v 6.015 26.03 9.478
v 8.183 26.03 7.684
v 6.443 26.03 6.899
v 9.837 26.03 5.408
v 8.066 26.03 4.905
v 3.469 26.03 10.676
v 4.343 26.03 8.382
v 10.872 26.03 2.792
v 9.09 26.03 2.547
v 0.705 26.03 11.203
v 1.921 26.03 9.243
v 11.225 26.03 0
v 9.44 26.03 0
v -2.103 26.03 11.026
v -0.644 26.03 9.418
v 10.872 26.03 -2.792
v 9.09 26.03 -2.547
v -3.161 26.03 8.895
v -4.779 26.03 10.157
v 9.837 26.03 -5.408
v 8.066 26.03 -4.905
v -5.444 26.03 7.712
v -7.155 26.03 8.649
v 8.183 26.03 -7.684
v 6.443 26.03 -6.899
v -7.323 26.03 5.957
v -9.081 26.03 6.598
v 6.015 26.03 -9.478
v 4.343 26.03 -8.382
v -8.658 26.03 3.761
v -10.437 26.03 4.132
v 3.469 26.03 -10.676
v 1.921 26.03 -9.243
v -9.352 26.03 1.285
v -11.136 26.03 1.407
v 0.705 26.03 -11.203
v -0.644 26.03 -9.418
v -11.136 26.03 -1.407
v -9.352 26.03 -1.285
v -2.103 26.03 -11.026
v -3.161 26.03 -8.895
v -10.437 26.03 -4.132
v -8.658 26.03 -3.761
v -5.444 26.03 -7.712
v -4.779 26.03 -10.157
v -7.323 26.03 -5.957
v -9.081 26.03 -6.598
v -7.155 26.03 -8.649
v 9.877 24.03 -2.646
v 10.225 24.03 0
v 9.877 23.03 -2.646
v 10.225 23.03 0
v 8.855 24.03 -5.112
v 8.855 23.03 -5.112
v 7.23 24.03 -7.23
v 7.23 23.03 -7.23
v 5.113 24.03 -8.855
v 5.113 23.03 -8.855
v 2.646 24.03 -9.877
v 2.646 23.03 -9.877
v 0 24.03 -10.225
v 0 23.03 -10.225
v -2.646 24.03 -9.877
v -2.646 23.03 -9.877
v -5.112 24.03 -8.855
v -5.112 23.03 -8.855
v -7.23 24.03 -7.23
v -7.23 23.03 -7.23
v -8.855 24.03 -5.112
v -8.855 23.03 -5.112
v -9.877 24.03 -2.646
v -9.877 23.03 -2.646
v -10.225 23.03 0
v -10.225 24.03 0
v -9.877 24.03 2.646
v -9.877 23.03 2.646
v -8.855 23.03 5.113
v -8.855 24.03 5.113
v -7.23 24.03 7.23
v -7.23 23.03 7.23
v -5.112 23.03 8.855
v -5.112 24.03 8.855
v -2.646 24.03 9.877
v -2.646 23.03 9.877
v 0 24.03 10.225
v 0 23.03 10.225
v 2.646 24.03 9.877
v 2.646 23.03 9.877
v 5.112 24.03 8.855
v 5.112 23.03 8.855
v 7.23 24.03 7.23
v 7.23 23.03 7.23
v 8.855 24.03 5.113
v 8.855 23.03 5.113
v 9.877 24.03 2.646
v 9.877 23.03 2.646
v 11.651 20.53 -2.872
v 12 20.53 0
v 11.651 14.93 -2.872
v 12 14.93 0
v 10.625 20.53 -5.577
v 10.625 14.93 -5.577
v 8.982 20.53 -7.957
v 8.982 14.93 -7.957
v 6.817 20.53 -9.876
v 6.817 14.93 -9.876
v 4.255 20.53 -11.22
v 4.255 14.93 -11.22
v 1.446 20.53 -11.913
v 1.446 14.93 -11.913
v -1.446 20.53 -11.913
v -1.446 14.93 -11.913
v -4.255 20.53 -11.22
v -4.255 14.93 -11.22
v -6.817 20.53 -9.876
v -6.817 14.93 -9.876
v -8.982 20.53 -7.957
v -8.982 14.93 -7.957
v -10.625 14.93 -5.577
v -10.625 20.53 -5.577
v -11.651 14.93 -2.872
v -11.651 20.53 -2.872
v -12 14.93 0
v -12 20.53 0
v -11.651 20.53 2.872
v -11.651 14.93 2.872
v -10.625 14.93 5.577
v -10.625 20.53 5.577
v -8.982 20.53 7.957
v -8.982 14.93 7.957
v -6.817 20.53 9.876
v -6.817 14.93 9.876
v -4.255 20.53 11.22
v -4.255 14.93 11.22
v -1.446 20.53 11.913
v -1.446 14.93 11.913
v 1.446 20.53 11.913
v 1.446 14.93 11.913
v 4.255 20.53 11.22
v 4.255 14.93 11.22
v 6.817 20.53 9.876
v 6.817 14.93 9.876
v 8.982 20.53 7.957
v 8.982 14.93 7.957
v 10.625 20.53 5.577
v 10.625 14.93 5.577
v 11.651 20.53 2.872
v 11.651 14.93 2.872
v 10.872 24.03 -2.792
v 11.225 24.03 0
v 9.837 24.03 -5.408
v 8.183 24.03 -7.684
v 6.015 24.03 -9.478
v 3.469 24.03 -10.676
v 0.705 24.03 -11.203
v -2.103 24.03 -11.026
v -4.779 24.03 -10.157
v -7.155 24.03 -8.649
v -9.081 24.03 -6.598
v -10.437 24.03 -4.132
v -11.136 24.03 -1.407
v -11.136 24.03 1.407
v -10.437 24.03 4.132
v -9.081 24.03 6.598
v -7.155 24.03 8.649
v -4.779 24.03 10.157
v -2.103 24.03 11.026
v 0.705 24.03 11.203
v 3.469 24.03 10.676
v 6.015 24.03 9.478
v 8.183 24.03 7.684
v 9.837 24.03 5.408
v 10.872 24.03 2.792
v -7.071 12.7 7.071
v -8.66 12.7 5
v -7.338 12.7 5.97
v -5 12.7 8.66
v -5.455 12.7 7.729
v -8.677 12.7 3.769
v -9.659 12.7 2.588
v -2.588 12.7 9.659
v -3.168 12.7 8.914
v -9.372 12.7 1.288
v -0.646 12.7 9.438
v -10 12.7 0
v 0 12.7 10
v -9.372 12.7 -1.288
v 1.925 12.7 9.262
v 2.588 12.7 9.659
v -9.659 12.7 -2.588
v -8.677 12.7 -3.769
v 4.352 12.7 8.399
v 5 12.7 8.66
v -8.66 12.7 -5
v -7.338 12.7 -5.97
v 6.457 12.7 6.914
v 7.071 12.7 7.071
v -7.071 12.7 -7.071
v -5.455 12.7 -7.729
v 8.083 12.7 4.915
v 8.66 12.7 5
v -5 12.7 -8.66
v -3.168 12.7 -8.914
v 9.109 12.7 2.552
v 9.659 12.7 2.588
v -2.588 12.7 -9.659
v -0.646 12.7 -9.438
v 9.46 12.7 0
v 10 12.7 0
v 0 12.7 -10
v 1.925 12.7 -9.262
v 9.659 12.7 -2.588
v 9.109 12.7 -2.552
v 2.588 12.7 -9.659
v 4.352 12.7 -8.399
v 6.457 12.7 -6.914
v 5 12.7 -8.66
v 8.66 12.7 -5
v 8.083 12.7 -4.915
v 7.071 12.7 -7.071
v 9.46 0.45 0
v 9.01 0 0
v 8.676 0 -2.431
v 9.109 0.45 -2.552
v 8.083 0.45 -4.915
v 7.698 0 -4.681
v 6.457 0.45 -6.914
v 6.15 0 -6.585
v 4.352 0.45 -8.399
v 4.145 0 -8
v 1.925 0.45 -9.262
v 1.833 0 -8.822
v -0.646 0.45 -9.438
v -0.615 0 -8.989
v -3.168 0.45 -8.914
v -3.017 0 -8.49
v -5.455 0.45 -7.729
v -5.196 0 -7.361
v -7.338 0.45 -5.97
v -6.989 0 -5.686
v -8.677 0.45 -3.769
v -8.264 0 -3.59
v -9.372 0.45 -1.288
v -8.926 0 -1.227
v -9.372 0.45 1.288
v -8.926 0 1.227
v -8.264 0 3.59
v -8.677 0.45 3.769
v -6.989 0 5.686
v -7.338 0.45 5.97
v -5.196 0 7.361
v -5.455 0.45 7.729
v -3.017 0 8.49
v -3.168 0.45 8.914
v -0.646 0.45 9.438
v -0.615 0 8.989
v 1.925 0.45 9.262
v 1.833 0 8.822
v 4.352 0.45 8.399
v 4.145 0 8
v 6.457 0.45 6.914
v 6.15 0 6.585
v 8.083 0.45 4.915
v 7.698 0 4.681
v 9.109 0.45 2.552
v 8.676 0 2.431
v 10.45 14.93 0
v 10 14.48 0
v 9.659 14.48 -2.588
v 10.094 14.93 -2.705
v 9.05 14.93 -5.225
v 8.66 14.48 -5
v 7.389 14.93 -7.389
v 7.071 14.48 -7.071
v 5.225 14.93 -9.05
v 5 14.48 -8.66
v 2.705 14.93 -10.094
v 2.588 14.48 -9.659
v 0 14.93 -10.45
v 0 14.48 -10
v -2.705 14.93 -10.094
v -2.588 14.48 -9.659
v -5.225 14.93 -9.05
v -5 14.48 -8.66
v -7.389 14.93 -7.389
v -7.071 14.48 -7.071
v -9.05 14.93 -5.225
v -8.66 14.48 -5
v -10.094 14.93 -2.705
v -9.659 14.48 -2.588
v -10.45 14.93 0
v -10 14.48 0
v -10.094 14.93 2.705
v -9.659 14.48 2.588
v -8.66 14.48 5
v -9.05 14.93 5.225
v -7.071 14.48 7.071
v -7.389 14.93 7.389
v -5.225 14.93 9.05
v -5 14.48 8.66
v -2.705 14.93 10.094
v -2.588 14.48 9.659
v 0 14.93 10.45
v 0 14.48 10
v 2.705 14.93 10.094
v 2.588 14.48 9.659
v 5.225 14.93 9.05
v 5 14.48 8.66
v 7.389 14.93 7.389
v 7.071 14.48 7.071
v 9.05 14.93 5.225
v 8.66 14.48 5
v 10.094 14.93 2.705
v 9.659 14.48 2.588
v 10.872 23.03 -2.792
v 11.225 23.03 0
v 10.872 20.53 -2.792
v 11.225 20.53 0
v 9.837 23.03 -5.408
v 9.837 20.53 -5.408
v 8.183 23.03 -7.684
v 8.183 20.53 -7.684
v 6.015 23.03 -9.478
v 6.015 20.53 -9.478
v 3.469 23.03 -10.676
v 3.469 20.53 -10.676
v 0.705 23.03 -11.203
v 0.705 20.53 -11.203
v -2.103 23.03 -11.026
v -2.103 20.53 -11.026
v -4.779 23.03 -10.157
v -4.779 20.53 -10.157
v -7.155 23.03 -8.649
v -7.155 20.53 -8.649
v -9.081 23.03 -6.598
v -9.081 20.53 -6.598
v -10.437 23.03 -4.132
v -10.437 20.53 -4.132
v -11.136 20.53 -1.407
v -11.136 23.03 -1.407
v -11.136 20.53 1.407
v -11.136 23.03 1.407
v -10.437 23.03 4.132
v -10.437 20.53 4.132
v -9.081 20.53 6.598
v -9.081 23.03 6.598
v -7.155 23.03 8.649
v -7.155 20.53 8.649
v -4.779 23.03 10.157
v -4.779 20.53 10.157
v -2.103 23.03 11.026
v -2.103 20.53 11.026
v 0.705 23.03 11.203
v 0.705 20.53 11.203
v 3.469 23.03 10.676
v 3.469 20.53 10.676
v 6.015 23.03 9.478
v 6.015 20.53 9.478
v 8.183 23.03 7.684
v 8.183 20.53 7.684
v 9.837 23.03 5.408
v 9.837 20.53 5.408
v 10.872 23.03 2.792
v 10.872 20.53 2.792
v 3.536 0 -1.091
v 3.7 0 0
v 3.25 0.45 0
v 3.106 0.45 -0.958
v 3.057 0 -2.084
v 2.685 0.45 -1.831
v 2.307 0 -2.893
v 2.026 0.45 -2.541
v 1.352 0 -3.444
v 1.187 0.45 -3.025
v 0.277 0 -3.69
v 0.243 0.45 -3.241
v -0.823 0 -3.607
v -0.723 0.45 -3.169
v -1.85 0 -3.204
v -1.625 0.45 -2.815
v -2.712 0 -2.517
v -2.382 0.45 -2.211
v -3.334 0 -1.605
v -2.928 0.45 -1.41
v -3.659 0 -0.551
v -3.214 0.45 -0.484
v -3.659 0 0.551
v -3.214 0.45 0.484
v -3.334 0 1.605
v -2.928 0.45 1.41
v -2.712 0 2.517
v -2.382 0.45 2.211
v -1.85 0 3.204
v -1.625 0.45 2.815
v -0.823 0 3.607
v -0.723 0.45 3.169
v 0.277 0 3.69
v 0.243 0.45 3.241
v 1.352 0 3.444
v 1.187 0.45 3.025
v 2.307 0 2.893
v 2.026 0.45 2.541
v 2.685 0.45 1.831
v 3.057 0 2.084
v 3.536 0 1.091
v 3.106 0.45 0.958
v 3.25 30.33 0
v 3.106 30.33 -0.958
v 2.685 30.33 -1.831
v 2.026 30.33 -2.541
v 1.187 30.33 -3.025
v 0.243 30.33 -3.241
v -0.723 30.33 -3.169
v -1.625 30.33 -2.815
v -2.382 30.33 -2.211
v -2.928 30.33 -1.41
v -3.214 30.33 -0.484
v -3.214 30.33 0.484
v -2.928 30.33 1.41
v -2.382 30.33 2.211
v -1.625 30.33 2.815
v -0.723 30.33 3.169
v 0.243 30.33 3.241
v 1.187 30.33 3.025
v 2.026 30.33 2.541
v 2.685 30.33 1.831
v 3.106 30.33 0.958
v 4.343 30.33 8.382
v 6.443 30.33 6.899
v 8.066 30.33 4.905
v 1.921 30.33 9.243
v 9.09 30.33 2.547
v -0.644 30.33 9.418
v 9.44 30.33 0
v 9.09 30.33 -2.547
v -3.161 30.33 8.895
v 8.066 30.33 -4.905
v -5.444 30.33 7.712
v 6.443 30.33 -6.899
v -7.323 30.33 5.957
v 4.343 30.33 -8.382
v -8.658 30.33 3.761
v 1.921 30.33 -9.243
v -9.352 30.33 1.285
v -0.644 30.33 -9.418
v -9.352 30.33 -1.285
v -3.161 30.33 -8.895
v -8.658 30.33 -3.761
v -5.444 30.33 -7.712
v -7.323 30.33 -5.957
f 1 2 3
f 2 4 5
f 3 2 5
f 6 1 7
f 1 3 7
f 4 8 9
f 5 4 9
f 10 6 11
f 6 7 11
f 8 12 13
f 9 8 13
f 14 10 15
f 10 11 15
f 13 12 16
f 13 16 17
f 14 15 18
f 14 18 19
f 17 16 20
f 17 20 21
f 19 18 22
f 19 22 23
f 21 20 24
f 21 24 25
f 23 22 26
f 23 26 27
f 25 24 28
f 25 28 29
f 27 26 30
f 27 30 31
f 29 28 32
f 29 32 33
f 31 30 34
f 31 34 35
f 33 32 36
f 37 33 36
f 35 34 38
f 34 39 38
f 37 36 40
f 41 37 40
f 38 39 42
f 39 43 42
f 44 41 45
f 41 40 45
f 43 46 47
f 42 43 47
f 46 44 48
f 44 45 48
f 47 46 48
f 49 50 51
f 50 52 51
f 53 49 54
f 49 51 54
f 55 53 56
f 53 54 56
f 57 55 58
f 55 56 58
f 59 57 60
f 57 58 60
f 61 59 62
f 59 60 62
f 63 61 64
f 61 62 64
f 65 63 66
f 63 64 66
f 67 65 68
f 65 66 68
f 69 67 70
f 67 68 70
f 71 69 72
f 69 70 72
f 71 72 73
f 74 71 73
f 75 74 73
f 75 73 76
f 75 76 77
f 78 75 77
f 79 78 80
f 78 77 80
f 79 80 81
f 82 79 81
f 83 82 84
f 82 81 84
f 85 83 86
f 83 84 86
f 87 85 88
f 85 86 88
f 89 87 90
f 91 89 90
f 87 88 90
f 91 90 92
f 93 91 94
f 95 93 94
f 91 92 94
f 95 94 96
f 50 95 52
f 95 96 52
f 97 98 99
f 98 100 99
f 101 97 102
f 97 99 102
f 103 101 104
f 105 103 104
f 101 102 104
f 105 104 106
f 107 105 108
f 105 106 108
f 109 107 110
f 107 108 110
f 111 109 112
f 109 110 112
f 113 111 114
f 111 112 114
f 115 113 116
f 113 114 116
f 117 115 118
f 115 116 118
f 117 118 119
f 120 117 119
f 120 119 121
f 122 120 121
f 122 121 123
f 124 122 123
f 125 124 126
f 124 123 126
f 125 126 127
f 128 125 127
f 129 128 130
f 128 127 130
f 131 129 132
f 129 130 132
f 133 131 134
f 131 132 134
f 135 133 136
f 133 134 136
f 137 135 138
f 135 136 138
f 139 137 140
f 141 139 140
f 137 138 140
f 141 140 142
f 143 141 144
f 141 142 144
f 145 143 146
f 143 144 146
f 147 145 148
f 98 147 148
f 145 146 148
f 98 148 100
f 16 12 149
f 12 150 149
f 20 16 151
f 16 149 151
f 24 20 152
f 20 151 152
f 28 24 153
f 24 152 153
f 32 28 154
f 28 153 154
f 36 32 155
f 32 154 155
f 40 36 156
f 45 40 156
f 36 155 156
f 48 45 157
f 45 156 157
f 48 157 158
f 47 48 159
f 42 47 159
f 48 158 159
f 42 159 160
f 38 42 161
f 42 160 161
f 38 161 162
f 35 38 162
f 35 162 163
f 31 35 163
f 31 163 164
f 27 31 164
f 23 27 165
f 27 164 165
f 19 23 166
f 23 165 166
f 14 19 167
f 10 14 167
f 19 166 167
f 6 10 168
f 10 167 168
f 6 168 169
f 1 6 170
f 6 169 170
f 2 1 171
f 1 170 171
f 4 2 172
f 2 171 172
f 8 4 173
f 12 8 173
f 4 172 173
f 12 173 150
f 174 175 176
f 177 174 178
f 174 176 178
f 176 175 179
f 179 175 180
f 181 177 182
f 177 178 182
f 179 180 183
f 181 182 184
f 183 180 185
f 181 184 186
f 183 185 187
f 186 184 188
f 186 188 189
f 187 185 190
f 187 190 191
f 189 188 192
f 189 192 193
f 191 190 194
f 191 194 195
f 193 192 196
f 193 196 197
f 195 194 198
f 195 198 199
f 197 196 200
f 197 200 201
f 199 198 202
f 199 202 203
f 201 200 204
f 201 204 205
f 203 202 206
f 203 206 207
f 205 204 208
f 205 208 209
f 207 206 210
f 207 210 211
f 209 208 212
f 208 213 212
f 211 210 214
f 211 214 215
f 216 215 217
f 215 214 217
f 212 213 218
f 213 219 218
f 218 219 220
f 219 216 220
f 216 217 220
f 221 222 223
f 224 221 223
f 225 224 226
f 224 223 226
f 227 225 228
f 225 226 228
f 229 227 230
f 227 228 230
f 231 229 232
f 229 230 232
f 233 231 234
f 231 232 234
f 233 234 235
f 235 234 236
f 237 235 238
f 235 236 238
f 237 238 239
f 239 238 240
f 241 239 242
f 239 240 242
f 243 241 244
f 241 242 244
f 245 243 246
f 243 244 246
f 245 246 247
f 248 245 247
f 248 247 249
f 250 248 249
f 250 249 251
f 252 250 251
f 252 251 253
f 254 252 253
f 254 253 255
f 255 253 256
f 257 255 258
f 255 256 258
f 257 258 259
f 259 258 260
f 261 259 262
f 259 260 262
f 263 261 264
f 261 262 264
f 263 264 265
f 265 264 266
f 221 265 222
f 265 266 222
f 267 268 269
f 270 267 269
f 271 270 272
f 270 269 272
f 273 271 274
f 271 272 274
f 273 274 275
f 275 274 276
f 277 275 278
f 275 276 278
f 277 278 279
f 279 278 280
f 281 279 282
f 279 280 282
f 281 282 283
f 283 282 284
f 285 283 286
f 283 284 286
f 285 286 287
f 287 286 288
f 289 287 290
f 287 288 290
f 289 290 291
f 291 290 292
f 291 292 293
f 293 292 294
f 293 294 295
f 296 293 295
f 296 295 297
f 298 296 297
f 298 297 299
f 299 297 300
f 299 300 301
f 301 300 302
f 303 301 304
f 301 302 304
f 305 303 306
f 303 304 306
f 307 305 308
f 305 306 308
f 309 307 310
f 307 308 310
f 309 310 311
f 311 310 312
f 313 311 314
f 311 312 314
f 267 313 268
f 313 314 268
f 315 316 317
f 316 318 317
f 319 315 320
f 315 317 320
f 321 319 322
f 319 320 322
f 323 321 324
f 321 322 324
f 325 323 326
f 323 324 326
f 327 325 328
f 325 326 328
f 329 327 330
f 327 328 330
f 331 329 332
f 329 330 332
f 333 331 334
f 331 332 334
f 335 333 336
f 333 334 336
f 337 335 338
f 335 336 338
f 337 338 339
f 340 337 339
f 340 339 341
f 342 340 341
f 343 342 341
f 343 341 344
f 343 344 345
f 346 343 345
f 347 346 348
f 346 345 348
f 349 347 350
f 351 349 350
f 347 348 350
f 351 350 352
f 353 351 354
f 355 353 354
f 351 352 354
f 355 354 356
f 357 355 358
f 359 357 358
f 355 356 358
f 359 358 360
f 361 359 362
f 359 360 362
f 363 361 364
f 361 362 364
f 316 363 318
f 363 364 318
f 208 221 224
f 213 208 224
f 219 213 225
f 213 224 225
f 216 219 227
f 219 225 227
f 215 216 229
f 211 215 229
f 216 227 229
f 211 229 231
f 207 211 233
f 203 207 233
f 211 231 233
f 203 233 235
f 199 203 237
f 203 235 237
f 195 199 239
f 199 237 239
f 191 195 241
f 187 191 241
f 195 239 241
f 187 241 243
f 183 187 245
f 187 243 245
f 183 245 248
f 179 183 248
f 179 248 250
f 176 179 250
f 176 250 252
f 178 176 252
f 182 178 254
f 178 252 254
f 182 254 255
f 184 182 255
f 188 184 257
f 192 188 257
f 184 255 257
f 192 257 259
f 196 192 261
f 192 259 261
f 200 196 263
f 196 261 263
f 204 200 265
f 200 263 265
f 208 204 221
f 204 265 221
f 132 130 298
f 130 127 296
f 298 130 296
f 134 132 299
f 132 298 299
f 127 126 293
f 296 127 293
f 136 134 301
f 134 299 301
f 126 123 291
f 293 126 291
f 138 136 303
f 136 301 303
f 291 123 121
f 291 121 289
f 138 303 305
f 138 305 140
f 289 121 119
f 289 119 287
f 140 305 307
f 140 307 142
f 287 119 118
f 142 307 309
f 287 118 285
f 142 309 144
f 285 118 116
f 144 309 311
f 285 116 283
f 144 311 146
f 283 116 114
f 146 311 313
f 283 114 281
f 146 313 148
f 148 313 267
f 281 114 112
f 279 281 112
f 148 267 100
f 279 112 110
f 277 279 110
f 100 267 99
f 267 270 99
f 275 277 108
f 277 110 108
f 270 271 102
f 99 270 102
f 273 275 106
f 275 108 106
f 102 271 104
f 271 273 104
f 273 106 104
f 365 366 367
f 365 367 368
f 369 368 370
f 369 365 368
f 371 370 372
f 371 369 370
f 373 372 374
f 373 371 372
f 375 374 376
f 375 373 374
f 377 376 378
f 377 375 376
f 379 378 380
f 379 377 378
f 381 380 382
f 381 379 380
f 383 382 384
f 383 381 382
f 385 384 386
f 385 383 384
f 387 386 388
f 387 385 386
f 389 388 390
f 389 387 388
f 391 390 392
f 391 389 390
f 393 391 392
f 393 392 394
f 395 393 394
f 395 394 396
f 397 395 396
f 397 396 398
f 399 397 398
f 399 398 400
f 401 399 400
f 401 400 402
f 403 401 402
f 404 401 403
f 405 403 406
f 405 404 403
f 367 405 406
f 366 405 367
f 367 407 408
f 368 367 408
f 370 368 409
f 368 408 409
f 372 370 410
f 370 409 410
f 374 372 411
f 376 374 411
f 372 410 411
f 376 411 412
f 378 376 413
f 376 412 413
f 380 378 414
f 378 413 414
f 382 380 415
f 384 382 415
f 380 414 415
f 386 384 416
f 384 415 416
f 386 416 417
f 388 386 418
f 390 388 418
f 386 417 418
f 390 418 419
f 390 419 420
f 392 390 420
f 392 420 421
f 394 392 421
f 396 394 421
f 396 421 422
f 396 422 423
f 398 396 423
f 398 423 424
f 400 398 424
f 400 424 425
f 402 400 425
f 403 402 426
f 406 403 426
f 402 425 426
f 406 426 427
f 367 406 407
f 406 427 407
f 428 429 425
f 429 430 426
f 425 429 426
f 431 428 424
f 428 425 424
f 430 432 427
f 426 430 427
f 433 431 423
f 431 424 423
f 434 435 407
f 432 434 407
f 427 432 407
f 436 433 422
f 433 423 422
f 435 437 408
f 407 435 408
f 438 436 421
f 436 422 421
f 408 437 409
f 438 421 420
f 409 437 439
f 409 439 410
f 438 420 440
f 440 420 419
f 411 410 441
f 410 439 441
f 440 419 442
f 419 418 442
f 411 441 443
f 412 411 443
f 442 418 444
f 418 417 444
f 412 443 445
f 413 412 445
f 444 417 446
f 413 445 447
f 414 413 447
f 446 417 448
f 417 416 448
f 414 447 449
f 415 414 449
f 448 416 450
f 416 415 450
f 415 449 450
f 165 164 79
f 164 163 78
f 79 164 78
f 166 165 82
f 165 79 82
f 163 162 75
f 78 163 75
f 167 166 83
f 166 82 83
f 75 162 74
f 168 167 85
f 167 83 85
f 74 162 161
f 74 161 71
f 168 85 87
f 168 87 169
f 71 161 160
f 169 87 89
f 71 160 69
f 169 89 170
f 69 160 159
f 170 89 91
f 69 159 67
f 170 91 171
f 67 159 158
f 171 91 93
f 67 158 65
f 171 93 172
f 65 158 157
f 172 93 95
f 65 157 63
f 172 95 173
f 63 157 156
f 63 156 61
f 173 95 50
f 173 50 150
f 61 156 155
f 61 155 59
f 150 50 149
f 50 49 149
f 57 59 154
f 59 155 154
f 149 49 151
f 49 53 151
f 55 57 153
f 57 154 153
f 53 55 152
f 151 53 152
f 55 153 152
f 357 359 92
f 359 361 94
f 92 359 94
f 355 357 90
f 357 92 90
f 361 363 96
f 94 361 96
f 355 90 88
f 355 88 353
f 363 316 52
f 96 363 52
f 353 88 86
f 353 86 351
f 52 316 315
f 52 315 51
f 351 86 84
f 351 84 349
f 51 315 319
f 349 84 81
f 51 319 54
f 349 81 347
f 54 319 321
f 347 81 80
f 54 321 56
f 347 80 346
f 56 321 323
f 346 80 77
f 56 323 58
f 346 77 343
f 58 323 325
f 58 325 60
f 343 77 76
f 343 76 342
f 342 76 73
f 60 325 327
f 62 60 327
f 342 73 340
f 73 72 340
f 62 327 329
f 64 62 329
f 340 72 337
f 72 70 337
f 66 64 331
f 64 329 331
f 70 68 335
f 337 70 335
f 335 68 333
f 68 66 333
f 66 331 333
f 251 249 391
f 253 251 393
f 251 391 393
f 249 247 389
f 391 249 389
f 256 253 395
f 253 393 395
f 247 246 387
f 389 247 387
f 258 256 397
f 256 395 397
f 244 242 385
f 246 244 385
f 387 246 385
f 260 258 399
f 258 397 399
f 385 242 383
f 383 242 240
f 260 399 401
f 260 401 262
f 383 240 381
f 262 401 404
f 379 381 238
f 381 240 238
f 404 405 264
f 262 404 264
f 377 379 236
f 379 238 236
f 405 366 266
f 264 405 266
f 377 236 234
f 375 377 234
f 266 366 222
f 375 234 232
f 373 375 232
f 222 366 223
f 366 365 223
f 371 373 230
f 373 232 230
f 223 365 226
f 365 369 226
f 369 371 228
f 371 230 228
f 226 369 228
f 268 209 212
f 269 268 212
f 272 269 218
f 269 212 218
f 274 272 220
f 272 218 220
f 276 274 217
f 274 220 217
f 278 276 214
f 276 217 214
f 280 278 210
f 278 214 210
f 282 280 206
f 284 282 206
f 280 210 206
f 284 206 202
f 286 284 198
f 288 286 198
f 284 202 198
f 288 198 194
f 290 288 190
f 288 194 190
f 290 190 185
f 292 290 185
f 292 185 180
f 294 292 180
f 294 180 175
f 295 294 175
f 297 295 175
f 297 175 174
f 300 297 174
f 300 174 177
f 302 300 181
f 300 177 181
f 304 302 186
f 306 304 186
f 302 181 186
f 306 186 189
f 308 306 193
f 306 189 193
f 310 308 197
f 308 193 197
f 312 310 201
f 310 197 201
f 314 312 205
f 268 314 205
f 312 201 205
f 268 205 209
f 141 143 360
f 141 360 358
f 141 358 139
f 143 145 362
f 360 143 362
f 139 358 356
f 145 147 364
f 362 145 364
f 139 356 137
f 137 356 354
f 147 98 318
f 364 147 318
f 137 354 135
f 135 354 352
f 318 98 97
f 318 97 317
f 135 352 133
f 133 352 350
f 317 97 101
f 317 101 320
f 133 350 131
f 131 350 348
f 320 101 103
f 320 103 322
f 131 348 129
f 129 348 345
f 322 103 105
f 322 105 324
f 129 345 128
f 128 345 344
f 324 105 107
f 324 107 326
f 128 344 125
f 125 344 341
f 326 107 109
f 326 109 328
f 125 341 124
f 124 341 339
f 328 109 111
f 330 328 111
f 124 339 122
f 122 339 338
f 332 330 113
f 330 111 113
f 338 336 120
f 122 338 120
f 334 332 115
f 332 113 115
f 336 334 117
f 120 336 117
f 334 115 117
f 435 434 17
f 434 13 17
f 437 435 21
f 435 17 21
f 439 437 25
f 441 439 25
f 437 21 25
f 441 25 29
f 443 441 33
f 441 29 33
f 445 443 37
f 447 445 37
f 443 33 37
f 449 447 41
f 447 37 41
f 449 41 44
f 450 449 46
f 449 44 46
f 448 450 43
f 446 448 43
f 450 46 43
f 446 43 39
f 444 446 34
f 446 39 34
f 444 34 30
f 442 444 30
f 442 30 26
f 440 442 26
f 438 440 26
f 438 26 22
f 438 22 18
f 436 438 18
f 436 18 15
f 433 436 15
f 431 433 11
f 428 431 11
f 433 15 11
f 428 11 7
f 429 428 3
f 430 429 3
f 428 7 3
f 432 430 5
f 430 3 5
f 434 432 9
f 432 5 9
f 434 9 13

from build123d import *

# Parameters (mm, degrees)
CHAMFER1_SIZE = 0.45


with BuildPart() as part:
    # Sketch1 → Revolve1 (revolve)
    with BuildSketch(Plane.XY):
        Polygon((3.25, 0), (3.25, 30.33), (9.44, 30.33), (9.44, 26.03), (11.225, 26.03), (11.225, 24.03), (10.225, 24.03), (10.225, 23.03), (11.225, 23.03), (11.225, 20.53), (12, 20.53), (12, 14.93), (10, 14.93), (10, 12.7), (9.46, 12.7), (9.46, 0), align=None)
    revolve(axis=Axis((0, 0, 0), (0, 1, 0)))

    # Chamfer1
    chamfer1_edges = [part.edges().sort_by_distance(p)[0] for p in [
        (-9.46, 0, 0),
        (-10, 14.93, 0),
        (-3.25, 0, 0),
    ]]
    chamfer(chamfer1_edges, length=CHAMFER1_SIZE)


solid = part.part
